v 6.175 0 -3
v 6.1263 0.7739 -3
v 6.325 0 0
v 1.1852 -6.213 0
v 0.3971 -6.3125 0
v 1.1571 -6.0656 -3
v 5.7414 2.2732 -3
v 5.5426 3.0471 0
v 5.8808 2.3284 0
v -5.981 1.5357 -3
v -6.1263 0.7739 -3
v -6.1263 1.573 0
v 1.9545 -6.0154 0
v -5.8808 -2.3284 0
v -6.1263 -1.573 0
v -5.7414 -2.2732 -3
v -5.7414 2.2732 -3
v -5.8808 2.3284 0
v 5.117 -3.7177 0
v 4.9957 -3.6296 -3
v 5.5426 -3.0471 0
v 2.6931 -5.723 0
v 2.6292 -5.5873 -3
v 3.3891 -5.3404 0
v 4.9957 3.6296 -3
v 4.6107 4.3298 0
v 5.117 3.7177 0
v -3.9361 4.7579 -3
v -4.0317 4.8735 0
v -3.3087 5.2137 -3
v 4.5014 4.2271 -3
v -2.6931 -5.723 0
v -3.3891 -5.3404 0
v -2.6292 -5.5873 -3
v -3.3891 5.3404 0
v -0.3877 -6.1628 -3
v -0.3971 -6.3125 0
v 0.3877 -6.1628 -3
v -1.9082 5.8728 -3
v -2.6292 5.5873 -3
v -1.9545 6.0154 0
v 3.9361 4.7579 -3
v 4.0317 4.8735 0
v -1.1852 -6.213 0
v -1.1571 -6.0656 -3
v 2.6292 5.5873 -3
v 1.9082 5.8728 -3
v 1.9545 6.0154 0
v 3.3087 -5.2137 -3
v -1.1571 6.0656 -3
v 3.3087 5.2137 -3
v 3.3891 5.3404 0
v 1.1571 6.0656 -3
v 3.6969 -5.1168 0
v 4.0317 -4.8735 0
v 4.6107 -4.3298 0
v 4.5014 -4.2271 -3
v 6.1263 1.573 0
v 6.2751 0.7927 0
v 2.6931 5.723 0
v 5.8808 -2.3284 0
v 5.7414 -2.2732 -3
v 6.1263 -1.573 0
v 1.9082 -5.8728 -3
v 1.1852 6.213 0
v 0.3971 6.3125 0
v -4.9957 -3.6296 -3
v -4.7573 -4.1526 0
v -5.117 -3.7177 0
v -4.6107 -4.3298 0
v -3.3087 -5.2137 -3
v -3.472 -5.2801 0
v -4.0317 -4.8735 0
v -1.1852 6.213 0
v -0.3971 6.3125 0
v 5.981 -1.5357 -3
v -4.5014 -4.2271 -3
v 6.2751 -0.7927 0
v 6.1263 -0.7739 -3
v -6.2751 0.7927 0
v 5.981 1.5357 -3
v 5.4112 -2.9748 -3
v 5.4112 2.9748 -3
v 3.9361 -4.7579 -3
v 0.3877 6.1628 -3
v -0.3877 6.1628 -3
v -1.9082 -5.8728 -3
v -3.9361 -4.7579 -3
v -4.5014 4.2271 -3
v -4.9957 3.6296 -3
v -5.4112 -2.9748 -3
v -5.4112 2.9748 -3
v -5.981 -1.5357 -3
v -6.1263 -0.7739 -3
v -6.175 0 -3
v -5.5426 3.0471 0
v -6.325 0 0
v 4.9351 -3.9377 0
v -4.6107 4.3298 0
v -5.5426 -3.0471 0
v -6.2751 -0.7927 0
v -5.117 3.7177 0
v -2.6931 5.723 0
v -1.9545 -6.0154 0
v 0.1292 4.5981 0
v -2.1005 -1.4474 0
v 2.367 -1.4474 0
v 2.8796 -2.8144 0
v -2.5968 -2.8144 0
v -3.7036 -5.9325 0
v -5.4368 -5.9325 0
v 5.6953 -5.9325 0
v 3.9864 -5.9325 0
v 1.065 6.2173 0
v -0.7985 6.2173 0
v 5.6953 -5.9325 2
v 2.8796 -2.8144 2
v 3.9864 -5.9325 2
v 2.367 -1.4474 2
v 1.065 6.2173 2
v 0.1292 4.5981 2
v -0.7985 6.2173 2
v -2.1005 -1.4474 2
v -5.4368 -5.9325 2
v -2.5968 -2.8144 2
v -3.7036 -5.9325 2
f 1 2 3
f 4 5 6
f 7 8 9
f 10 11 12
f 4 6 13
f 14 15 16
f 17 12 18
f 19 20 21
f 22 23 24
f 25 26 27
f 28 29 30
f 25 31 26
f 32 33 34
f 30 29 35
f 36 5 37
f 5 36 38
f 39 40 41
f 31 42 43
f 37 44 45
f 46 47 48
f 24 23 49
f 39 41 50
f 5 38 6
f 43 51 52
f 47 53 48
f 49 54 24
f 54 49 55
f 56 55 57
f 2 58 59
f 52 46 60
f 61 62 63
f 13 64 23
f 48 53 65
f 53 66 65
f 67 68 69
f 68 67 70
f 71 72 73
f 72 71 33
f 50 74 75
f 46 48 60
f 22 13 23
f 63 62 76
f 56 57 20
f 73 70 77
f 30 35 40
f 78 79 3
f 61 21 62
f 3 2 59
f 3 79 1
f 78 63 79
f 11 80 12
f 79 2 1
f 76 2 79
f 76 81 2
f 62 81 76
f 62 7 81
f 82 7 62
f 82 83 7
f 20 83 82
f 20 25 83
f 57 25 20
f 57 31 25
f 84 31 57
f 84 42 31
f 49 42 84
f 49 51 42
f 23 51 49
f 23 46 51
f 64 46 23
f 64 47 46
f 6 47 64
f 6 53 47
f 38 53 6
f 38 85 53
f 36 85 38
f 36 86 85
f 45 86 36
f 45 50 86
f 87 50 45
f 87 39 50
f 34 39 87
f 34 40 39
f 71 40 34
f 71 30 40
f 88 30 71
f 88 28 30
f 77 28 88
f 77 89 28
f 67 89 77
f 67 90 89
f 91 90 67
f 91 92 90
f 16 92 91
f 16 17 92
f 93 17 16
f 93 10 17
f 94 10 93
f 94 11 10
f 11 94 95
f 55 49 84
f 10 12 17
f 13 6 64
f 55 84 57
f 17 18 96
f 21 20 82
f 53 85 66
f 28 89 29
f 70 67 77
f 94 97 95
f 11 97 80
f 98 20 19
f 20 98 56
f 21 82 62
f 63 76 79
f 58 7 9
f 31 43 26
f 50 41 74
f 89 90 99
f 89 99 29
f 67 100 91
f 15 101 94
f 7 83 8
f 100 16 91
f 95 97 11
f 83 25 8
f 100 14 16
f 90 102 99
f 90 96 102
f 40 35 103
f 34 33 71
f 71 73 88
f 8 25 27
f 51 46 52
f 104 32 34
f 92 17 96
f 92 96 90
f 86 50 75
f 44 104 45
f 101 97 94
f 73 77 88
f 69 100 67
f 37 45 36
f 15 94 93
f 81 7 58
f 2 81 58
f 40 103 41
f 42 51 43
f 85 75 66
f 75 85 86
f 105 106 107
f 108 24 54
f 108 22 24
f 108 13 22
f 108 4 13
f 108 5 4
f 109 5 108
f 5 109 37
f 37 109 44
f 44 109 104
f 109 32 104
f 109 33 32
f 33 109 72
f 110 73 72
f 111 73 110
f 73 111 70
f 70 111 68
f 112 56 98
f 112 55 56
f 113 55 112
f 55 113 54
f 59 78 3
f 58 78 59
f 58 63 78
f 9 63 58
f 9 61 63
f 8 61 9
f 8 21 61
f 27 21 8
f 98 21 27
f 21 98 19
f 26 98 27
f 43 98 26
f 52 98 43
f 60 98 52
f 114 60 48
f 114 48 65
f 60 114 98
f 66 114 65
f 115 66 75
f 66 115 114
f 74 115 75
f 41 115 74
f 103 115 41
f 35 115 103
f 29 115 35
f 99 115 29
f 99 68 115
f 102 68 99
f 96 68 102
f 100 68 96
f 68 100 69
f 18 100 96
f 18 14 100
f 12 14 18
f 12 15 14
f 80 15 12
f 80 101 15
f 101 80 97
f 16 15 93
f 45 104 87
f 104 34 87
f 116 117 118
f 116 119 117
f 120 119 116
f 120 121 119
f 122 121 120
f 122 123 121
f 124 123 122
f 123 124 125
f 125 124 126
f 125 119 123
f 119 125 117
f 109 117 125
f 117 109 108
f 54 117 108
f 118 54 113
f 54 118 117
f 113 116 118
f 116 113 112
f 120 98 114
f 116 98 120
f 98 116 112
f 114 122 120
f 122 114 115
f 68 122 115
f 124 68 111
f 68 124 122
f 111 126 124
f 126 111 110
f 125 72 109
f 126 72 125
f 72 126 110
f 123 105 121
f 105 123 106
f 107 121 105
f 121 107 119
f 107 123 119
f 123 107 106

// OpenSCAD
$fn = 50;

difference() {
	union() {
		translate(v = [0, 0, -3.0]) {
			cylinder(h = 3, r1 = 6.175, r2 = 6.325);
		}
		linear_extrude(height = 2) {
			text(font = "Impact", halign = "center", size = 12, text = "A", valign = "center");
		}
	}
	union();
}
